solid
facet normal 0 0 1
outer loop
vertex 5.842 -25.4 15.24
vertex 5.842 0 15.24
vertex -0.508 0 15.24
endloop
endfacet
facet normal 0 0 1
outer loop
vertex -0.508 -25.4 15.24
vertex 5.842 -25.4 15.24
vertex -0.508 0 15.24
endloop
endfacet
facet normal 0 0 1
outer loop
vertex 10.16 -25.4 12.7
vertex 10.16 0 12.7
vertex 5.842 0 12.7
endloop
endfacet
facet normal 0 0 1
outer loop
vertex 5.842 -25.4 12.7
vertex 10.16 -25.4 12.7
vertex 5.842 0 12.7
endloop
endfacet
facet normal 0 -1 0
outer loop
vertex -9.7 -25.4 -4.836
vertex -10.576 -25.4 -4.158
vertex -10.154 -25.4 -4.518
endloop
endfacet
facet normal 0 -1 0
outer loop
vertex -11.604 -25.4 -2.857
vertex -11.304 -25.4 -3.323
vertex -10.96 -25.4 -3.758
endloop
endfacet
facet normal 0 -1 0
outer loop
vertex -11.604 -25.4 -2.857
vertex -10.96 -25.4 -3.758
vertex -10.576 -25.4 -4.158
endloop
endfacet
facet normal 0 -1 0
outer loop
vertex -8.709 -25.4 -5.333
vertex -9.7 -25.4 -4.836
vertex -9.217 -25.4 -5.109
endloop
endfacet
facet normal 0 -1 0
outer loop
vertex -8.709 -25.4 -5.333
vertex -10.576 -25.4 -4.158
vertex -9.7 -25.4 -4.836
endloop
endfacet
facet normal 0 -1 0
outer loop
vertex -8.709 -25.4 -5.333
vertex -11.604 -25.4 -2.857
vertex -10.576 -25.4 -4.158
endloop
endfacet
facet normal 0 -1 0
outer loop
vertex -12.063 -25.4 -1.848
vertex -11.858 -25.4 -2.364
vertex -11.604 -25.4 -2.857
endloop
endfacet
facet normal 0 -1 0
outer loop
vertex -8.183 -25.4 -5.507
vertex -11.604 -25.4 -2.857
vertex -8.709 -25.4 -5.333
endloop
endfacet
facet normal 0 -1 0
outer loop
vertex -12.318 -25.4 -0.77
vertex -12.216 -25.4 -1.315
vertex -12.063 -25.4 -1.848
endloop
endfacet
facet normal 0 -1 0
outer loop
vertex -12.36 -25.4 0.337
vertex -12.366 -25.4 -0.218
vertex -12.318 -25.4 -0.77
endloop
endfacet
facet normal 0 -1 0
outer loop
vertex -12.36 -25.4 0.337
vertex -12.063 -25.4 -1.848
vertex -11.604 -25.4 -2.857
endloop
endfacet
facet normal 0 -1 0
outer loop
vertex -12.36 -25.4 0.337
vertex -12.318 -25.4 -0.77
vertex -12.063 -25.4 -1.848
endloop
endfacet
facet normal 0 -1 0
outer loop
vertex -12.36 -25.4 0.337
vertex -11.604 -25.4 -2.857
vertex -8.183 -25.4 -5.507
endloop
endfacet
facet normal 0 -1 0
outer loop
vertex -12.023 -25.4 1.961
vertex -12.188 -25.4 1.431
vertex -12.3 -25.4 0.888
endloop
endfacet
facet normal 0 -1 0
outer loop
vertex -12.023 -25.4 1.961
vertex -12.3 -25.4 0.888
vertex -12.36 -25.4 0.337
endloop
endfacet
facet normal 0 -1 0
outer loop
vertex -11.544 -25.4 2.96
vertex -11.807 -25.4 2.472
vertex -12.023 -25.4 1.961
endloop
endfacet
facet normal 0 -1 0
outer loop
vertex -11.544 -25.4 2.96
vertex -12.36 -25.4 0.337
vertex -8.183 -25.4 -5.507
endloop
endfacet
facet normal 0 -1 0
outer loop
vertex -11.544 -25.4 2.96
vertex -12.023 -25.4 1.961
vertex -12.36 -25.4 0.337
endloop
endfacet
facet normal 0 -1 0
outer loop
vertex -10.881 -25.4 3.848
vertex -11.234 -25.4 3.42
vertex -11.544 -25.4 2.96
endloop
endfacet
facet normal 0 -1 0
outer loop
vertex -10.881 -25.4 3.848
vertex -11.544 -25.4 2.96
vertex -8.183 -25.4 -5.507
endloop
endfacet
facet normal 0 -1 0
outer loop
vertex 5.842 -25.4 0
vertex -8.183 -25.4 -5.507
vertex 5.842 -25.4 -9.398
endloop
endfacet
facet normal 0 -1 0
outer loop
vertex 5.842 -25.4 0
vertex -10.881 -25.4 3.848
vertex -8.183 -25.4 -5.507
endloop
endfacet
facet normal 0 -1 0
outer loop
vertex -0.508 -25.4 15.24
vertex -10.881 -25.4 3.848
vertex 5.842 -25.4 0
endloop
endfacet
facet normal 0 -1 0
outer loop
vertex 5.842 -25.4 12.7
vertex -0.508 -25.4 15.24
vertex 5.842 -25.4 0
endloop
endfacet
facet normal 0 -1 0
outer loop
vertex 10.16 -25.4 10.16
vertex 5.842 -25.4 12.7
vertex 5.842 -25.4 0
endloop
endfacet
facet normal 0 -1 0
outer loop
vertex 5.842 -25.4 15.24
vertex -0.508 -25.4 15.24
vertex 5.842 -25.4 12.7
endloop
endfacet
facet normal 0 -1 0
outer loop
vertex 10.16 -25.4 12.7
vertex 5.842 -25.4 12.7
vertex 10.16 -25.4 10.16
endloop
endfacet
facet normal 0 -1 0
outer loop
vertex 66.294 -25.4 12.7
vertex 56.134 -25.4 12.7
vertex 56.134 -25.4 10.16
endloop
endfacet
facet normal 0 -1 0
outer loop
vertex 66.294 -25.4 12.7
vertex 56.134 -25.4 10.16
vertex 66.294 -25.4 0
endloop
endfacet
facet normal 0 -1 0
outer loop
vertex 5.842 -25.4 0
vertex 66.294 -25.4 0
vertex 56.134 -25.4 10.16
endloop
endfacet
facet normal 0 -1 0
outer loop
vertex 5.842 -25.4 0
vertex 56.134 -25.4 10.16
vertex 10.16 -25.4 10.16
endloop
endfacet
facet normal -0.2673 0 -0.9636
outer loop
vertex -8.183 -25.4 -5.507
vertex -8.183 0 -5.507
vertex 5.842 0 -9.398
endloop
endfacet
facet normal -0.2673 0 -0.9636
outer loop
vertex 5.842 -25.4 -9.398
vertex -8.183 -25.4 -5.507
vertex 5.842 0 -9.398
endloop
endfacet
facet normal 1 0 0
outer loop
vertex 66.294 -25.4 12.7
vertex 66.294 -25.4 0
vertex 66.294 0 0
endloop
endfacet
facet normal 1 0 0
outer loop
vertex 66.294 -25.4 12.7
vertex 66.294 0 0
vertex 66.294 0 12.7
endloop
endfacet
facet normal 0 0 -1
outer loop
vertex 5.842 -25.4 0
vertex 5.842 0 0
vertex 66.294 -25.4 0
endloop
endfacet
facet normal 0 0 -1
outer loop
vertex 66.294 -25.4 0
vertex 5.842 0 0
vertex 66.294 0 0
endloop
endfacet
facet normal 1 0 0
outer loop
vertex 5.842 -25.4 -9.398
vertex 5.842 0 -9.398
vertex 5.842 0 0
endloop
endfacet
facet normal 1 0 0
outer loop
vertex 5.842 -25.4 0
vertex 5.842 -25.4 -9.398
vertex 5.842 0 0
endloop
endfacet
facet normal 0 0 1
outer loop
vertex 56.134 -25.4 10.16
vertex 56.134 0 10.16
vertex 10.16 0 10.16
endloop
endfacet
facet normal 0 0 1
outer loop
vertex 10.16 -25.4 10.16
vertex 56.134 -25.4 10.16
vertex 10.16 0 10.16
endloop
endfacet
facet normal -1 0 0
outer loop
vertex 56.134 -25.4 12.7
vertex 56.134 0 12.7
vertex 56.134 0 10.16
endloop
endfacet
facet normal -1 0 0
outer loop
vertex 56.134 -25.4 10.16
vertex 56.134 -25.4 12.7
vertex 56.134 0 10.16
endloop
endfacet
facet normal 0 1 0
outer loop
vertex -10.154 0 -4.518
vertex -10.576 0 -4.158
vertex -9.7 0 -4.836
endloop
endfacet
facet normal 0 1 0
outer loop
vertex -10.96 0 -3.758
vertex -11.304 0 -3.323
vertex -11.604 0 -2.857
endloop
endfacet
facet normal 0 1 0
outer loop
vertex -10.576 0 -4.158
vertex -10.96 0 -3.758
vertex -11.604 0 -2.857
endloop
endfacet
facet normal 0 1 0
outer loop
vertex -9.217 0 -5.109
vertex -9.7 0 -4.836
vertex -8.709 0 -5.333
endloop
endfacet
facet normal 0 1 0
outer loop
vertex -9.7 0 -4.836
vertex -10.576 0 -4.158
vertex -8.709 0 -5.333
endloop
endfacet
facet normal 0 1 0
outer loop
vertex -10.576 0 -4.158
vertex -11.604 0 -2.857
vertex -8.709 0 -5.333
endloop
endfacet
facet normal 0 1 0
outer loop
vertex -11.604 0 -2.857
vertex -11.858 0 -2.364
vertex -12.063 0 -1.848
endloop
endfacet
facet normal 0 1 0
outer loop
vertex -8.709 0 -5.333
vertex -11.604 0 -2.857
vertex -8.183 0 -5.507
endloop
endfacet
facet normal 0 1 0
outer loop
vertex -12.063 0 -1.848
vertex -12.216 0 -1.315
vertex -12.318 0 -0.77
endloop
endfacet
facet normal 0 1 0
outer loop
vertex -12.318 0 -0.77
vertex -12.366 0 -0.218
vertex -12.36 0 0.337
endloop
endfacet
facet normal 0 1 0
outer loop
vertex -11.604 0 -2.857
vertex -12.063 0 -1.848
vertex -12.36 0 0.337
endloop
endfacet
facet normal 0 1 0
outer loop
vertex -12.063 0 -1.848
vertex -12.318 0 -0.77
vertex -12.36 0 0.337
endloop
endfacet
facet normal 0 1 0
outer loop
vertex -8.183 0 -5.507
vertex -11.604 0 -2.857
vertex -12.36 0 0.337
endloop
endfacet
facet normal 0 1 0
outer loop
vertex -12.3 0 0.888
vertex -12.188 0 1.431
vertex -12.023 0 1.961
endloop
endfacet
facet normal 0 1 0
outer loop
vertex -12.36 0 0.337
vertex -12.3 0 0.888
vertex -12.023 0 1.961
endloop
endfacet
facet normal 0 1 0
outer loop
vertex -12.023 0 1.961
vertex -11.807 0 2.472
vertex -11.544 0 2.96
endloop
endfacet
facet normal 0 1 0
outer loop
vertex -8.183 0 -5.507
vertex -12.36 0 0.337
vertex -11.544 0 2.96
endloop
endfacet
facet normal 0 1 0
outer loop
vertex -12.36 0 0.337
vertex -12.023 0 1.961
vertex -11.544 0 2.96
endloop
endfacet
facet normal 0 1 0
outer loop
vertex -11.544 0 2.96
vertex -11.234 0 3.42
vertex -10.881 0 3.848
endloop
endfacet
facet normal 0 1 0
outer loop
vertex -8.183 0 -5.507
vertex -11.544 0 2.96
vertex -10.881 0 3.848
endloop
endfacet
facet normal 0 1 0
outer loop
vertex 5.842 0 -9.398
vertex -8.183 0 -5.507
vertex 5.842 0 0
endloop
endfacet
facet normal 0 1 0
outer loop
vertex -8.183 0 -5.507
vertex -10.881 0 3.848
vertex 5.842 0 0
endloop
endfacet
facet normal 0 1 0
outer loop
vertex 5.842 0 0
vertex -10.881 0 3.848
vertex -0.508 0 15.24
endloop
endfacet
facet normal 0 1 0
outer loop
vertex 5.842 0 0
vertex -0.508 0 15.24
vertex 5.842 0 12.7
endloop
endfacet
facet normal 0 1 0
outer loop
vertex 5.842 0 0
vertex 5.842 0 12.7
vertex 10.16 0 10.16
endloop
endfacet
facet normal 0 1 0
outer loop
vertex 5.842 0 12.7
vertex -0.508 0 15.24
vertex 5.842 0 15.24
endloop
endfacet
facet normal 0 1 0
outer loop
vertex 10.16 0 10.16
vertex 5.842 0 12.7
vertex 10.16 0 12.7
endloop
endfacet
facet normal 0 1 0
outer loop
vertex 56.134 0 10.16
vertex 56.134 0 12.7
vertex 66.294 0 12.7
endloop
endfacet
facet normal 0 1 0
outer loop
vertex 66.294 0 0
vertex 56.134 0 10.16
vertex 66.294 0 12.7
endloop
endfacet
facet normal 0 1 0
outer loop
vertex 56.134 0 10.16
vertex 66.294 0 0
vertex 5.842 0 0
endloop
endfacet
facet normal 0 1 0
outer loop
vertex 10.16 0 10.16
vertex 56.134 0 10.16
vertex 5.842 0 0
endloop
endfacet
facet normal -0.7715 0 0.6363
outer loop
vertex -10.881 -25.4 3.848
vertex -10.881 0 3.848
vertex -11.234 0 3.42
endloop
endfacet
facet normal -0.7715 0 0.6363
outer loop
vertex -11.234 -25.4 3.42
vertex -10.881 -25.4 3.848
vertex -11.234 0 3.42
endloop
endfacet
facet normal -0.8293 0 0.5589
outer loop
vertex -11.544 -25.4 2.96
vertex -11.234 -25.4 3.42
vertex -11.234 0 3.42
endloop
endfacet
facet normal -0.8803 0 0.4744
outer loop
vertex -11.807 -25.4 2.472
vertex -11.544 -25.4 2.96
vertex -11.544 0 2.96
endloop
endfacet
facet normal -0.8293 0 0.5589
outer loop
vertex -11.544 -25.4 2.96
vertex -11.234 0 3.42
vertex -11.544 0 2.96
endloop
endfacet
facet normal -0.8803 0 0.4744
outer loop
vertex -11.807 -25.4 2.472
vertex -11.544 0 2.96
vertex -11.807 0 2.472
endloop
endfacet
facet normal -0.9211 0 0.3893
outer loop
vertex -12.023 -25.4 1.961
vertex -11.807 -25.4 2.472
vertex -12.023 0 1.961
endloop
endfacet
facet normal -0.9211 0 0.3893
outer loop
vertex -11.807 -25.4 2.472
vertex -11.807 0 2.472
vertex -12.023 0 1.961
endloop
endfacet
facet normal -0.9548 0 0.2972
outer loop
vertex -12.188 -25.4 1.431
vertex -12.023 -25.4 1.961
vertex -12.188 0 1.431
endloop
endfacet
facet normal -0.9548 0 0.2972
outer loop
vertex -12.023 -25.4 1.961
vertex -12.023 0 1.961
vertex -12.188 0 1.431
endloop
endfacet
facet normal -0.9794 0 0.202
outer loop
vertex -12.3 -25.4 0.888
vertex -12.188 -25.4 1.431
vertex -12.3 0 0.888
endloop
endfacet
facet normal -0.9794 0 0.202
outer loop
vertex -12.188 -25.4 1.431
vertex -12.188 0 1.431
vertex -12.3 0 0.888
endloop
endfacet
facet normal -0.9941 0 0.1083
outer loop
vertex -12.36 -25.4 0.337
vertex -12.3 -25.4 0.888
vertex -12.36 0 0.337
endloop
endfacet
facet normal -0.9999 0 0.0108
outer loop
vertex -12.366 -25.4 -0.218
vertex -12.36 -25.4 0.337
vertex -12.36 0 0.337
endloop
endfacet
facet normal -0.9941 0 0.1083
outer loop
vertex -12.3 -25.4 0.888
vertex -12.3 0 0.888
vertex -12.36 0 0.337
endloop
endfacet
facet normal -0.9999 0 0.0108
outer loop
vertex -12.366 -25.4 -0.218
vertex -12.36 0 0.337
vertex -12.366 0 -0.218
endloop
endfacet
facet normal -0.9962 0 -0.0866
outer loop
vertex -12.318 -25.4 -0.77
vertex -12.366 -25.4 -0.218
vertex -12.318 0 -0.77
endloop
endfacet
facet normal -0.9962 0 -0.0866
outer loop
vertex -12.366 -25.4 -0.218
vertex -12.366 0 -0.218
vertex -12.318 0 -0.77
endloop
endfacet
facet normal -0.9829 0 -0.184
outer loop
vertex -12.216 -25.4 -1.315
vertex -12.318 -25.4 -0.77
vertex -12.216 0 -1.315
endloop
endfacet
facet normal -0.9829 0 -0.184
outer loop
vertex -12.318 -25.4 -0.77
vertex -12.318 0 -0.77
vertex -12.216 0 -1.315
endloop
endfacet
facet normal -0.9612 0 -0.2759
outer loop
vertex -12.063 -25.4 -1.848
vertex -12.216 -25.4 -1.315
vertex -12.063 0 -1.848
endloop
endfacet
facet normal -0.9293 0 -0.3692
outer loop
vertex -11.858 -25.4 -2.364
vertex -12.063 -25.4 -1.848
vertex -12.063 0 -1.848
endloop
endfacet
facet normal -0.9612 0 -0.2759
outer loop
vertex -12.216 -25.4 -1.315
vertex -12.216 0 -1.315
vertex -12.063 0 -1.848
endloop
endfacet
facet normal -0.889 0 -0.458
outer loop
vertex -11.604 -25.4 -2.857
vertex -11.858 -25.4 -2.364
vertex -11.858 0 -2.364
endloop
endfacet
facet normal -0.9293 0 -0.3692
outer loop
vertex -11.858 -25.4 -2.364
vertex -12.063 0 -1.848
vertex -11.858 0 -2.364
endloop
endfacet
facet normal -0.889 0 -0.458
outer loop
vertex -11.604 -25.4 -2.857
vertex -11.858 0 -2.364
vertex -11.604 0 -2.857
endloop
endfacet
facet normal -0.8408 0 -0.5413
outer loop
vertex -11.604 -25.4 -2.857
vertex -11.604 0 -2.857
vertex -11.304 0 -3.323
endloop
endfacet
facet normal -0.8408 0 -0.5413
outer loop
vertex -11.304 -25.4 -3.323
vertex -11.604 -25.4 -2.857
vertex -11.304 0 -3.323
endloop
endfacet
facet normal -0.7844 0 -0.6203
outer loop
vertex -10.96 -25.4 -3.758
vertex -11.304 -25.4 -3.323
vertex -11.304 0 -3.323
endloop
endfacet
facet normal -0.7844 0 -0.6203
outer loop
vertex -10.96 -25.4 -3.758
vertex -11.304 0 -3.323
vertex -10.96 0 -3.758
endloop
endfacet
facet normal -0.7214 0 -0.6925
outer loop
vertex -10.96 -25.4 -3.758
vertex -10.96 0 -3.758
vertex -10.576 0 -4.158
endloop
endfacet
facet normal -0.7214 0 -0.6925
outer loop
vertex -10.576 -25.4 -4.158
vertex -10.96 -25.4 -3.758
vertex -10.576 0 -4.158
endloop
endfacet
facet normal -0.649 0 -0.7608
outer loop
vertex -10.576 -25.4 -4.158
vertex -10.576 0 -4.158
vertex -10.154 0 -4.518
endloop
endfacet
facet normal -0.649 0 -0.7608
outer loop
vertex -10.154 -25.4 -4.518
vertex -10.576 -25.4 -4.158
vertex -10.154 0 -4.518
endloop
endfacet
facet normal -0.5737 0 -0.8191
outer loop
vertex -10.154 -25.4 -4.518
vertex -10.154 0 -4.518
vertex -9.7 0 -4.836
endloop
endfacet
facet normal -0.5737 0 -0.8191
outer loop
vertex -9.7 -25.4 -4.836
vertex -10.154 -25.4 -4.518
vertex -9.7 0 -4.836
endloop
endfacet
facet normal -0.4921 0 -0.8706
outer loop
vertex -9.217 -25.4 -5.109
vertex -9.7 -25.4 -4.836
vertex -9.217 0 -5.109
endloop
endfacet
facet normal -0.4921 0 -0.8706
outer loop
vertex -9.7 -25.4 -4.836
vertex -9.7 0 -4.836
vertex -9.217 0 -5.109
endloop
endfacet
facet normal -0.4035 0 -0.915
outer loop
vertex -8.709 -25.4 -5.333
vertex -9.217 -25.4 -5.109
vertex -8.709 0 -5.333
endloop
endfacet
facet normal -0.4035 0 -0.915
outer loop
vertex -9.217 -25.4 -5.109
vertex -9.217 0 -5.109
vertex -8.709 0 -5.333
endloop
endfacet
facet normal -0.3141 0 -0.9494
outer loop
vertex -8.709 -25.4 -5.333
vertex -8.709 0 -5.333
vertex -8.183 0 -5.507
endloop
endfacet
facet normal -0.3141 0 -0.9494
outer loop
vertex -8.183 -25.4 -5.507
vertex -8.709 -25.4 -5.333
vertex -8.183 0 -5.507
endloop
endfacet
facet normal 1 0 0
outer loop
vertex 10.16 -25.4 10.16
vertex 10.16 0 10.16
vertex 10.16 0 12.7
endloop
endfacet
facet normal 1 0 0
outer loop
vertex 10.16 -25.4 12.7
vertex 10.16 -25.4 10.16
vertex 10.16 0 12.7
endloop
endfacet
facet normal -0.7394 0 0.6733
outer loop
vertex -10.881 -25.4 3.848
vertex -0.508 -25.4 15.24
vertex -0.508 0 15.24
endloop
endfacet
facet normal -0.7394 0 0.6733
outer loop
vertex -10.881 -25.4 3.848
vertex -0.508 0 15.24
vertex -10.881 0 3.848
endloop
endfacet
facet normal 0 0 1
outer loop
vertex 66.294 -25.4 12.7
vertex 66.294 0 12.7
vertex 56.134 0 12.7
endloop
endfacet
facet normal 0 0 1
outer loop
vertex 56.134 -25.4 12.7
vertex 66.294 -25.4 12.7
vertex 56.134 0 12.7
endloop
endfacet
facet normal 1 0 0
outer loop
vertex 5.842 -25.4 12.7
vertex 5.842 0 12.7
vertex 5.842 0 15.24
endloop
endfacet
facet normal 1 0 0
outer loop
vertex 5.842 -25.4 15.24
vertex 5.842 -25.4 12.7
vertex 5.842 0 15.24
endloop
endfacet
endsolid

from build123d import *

# Parameters (mm, degrees)
F0_R     = 3.175
F0_W     = 5.842
F0_H     = 12.7
F1_DEPTH = 25.4


with BuildPart() as f1:
    # F0 (on Front) → F1 (new body)
    with BuildSketch(Plane.XZ):
        Polygon((5.842, 12.7), (5.842, 0), (66.294, 0), (66.294, 12.7), (56.134, 12.7), (56.134, 10.16), (10.16, 10.16), (10.16, 12.7), align=None)
        with BuildLine():
            ThreePointArc((-8.1826630726, -5.5069827884), (-3.1957909266, -4.5493385486), (-0.9398, 0))
            ThreePointArc((-0.9398, 0), (-4.5919612295, 5.3297205562), (-10.8806298187, 3.8475430269))
            ThreePointArc((-10.8806298187, 3.8475430269), (-12.1459778134, -1.5837270034), (-8.1826630726, -5.5069827884))
        make_face()
        with Locations((-6.6548, 0)):
            Circle(F0_R, mode=Mode.SUBTRACT)
        with BuildLine():
            Line((-0.9398, 0), (0, 0))
            Line((0, 0), (0, 12.7))
            Line((0, 12.7), (5.842, 12.7))
            Line((5.842, 12.7), (5.842, 15.24))
            Line((5.842, 15.24), (-0.508, 15.24))
            Line((-0.508, 15.24), (-10.8806298187, 3.8475430269))
            ThreePointArc((-10.8806298187, 3.8475430269), (-4.5919612295, 5.3297205562), (-0.9398, 0))
        make_face()
        with Locations((2.921, 6.35)):
            Rectangle(F0_W, F0_H)
        with BuildLine():
            Line((5.842, 0), (0, 0))
            Line((0, 0), (-0.9398, 0))
            ThreePointArc((-0.9398, 0), (-3.1957909266, -4.5493385486), (-8.1826630726, -5.5069827884))
            Line((-8.1826630726, -5.5069827884), (5.842, -9.398))
            Line((5.842, -9.398), (5.842, 0))
        make_face()
        with Locations((-6.6548, 0)):
            Circle(F0_R)
    extrude(amount=F1_DEPTH)


solid = f1.part
